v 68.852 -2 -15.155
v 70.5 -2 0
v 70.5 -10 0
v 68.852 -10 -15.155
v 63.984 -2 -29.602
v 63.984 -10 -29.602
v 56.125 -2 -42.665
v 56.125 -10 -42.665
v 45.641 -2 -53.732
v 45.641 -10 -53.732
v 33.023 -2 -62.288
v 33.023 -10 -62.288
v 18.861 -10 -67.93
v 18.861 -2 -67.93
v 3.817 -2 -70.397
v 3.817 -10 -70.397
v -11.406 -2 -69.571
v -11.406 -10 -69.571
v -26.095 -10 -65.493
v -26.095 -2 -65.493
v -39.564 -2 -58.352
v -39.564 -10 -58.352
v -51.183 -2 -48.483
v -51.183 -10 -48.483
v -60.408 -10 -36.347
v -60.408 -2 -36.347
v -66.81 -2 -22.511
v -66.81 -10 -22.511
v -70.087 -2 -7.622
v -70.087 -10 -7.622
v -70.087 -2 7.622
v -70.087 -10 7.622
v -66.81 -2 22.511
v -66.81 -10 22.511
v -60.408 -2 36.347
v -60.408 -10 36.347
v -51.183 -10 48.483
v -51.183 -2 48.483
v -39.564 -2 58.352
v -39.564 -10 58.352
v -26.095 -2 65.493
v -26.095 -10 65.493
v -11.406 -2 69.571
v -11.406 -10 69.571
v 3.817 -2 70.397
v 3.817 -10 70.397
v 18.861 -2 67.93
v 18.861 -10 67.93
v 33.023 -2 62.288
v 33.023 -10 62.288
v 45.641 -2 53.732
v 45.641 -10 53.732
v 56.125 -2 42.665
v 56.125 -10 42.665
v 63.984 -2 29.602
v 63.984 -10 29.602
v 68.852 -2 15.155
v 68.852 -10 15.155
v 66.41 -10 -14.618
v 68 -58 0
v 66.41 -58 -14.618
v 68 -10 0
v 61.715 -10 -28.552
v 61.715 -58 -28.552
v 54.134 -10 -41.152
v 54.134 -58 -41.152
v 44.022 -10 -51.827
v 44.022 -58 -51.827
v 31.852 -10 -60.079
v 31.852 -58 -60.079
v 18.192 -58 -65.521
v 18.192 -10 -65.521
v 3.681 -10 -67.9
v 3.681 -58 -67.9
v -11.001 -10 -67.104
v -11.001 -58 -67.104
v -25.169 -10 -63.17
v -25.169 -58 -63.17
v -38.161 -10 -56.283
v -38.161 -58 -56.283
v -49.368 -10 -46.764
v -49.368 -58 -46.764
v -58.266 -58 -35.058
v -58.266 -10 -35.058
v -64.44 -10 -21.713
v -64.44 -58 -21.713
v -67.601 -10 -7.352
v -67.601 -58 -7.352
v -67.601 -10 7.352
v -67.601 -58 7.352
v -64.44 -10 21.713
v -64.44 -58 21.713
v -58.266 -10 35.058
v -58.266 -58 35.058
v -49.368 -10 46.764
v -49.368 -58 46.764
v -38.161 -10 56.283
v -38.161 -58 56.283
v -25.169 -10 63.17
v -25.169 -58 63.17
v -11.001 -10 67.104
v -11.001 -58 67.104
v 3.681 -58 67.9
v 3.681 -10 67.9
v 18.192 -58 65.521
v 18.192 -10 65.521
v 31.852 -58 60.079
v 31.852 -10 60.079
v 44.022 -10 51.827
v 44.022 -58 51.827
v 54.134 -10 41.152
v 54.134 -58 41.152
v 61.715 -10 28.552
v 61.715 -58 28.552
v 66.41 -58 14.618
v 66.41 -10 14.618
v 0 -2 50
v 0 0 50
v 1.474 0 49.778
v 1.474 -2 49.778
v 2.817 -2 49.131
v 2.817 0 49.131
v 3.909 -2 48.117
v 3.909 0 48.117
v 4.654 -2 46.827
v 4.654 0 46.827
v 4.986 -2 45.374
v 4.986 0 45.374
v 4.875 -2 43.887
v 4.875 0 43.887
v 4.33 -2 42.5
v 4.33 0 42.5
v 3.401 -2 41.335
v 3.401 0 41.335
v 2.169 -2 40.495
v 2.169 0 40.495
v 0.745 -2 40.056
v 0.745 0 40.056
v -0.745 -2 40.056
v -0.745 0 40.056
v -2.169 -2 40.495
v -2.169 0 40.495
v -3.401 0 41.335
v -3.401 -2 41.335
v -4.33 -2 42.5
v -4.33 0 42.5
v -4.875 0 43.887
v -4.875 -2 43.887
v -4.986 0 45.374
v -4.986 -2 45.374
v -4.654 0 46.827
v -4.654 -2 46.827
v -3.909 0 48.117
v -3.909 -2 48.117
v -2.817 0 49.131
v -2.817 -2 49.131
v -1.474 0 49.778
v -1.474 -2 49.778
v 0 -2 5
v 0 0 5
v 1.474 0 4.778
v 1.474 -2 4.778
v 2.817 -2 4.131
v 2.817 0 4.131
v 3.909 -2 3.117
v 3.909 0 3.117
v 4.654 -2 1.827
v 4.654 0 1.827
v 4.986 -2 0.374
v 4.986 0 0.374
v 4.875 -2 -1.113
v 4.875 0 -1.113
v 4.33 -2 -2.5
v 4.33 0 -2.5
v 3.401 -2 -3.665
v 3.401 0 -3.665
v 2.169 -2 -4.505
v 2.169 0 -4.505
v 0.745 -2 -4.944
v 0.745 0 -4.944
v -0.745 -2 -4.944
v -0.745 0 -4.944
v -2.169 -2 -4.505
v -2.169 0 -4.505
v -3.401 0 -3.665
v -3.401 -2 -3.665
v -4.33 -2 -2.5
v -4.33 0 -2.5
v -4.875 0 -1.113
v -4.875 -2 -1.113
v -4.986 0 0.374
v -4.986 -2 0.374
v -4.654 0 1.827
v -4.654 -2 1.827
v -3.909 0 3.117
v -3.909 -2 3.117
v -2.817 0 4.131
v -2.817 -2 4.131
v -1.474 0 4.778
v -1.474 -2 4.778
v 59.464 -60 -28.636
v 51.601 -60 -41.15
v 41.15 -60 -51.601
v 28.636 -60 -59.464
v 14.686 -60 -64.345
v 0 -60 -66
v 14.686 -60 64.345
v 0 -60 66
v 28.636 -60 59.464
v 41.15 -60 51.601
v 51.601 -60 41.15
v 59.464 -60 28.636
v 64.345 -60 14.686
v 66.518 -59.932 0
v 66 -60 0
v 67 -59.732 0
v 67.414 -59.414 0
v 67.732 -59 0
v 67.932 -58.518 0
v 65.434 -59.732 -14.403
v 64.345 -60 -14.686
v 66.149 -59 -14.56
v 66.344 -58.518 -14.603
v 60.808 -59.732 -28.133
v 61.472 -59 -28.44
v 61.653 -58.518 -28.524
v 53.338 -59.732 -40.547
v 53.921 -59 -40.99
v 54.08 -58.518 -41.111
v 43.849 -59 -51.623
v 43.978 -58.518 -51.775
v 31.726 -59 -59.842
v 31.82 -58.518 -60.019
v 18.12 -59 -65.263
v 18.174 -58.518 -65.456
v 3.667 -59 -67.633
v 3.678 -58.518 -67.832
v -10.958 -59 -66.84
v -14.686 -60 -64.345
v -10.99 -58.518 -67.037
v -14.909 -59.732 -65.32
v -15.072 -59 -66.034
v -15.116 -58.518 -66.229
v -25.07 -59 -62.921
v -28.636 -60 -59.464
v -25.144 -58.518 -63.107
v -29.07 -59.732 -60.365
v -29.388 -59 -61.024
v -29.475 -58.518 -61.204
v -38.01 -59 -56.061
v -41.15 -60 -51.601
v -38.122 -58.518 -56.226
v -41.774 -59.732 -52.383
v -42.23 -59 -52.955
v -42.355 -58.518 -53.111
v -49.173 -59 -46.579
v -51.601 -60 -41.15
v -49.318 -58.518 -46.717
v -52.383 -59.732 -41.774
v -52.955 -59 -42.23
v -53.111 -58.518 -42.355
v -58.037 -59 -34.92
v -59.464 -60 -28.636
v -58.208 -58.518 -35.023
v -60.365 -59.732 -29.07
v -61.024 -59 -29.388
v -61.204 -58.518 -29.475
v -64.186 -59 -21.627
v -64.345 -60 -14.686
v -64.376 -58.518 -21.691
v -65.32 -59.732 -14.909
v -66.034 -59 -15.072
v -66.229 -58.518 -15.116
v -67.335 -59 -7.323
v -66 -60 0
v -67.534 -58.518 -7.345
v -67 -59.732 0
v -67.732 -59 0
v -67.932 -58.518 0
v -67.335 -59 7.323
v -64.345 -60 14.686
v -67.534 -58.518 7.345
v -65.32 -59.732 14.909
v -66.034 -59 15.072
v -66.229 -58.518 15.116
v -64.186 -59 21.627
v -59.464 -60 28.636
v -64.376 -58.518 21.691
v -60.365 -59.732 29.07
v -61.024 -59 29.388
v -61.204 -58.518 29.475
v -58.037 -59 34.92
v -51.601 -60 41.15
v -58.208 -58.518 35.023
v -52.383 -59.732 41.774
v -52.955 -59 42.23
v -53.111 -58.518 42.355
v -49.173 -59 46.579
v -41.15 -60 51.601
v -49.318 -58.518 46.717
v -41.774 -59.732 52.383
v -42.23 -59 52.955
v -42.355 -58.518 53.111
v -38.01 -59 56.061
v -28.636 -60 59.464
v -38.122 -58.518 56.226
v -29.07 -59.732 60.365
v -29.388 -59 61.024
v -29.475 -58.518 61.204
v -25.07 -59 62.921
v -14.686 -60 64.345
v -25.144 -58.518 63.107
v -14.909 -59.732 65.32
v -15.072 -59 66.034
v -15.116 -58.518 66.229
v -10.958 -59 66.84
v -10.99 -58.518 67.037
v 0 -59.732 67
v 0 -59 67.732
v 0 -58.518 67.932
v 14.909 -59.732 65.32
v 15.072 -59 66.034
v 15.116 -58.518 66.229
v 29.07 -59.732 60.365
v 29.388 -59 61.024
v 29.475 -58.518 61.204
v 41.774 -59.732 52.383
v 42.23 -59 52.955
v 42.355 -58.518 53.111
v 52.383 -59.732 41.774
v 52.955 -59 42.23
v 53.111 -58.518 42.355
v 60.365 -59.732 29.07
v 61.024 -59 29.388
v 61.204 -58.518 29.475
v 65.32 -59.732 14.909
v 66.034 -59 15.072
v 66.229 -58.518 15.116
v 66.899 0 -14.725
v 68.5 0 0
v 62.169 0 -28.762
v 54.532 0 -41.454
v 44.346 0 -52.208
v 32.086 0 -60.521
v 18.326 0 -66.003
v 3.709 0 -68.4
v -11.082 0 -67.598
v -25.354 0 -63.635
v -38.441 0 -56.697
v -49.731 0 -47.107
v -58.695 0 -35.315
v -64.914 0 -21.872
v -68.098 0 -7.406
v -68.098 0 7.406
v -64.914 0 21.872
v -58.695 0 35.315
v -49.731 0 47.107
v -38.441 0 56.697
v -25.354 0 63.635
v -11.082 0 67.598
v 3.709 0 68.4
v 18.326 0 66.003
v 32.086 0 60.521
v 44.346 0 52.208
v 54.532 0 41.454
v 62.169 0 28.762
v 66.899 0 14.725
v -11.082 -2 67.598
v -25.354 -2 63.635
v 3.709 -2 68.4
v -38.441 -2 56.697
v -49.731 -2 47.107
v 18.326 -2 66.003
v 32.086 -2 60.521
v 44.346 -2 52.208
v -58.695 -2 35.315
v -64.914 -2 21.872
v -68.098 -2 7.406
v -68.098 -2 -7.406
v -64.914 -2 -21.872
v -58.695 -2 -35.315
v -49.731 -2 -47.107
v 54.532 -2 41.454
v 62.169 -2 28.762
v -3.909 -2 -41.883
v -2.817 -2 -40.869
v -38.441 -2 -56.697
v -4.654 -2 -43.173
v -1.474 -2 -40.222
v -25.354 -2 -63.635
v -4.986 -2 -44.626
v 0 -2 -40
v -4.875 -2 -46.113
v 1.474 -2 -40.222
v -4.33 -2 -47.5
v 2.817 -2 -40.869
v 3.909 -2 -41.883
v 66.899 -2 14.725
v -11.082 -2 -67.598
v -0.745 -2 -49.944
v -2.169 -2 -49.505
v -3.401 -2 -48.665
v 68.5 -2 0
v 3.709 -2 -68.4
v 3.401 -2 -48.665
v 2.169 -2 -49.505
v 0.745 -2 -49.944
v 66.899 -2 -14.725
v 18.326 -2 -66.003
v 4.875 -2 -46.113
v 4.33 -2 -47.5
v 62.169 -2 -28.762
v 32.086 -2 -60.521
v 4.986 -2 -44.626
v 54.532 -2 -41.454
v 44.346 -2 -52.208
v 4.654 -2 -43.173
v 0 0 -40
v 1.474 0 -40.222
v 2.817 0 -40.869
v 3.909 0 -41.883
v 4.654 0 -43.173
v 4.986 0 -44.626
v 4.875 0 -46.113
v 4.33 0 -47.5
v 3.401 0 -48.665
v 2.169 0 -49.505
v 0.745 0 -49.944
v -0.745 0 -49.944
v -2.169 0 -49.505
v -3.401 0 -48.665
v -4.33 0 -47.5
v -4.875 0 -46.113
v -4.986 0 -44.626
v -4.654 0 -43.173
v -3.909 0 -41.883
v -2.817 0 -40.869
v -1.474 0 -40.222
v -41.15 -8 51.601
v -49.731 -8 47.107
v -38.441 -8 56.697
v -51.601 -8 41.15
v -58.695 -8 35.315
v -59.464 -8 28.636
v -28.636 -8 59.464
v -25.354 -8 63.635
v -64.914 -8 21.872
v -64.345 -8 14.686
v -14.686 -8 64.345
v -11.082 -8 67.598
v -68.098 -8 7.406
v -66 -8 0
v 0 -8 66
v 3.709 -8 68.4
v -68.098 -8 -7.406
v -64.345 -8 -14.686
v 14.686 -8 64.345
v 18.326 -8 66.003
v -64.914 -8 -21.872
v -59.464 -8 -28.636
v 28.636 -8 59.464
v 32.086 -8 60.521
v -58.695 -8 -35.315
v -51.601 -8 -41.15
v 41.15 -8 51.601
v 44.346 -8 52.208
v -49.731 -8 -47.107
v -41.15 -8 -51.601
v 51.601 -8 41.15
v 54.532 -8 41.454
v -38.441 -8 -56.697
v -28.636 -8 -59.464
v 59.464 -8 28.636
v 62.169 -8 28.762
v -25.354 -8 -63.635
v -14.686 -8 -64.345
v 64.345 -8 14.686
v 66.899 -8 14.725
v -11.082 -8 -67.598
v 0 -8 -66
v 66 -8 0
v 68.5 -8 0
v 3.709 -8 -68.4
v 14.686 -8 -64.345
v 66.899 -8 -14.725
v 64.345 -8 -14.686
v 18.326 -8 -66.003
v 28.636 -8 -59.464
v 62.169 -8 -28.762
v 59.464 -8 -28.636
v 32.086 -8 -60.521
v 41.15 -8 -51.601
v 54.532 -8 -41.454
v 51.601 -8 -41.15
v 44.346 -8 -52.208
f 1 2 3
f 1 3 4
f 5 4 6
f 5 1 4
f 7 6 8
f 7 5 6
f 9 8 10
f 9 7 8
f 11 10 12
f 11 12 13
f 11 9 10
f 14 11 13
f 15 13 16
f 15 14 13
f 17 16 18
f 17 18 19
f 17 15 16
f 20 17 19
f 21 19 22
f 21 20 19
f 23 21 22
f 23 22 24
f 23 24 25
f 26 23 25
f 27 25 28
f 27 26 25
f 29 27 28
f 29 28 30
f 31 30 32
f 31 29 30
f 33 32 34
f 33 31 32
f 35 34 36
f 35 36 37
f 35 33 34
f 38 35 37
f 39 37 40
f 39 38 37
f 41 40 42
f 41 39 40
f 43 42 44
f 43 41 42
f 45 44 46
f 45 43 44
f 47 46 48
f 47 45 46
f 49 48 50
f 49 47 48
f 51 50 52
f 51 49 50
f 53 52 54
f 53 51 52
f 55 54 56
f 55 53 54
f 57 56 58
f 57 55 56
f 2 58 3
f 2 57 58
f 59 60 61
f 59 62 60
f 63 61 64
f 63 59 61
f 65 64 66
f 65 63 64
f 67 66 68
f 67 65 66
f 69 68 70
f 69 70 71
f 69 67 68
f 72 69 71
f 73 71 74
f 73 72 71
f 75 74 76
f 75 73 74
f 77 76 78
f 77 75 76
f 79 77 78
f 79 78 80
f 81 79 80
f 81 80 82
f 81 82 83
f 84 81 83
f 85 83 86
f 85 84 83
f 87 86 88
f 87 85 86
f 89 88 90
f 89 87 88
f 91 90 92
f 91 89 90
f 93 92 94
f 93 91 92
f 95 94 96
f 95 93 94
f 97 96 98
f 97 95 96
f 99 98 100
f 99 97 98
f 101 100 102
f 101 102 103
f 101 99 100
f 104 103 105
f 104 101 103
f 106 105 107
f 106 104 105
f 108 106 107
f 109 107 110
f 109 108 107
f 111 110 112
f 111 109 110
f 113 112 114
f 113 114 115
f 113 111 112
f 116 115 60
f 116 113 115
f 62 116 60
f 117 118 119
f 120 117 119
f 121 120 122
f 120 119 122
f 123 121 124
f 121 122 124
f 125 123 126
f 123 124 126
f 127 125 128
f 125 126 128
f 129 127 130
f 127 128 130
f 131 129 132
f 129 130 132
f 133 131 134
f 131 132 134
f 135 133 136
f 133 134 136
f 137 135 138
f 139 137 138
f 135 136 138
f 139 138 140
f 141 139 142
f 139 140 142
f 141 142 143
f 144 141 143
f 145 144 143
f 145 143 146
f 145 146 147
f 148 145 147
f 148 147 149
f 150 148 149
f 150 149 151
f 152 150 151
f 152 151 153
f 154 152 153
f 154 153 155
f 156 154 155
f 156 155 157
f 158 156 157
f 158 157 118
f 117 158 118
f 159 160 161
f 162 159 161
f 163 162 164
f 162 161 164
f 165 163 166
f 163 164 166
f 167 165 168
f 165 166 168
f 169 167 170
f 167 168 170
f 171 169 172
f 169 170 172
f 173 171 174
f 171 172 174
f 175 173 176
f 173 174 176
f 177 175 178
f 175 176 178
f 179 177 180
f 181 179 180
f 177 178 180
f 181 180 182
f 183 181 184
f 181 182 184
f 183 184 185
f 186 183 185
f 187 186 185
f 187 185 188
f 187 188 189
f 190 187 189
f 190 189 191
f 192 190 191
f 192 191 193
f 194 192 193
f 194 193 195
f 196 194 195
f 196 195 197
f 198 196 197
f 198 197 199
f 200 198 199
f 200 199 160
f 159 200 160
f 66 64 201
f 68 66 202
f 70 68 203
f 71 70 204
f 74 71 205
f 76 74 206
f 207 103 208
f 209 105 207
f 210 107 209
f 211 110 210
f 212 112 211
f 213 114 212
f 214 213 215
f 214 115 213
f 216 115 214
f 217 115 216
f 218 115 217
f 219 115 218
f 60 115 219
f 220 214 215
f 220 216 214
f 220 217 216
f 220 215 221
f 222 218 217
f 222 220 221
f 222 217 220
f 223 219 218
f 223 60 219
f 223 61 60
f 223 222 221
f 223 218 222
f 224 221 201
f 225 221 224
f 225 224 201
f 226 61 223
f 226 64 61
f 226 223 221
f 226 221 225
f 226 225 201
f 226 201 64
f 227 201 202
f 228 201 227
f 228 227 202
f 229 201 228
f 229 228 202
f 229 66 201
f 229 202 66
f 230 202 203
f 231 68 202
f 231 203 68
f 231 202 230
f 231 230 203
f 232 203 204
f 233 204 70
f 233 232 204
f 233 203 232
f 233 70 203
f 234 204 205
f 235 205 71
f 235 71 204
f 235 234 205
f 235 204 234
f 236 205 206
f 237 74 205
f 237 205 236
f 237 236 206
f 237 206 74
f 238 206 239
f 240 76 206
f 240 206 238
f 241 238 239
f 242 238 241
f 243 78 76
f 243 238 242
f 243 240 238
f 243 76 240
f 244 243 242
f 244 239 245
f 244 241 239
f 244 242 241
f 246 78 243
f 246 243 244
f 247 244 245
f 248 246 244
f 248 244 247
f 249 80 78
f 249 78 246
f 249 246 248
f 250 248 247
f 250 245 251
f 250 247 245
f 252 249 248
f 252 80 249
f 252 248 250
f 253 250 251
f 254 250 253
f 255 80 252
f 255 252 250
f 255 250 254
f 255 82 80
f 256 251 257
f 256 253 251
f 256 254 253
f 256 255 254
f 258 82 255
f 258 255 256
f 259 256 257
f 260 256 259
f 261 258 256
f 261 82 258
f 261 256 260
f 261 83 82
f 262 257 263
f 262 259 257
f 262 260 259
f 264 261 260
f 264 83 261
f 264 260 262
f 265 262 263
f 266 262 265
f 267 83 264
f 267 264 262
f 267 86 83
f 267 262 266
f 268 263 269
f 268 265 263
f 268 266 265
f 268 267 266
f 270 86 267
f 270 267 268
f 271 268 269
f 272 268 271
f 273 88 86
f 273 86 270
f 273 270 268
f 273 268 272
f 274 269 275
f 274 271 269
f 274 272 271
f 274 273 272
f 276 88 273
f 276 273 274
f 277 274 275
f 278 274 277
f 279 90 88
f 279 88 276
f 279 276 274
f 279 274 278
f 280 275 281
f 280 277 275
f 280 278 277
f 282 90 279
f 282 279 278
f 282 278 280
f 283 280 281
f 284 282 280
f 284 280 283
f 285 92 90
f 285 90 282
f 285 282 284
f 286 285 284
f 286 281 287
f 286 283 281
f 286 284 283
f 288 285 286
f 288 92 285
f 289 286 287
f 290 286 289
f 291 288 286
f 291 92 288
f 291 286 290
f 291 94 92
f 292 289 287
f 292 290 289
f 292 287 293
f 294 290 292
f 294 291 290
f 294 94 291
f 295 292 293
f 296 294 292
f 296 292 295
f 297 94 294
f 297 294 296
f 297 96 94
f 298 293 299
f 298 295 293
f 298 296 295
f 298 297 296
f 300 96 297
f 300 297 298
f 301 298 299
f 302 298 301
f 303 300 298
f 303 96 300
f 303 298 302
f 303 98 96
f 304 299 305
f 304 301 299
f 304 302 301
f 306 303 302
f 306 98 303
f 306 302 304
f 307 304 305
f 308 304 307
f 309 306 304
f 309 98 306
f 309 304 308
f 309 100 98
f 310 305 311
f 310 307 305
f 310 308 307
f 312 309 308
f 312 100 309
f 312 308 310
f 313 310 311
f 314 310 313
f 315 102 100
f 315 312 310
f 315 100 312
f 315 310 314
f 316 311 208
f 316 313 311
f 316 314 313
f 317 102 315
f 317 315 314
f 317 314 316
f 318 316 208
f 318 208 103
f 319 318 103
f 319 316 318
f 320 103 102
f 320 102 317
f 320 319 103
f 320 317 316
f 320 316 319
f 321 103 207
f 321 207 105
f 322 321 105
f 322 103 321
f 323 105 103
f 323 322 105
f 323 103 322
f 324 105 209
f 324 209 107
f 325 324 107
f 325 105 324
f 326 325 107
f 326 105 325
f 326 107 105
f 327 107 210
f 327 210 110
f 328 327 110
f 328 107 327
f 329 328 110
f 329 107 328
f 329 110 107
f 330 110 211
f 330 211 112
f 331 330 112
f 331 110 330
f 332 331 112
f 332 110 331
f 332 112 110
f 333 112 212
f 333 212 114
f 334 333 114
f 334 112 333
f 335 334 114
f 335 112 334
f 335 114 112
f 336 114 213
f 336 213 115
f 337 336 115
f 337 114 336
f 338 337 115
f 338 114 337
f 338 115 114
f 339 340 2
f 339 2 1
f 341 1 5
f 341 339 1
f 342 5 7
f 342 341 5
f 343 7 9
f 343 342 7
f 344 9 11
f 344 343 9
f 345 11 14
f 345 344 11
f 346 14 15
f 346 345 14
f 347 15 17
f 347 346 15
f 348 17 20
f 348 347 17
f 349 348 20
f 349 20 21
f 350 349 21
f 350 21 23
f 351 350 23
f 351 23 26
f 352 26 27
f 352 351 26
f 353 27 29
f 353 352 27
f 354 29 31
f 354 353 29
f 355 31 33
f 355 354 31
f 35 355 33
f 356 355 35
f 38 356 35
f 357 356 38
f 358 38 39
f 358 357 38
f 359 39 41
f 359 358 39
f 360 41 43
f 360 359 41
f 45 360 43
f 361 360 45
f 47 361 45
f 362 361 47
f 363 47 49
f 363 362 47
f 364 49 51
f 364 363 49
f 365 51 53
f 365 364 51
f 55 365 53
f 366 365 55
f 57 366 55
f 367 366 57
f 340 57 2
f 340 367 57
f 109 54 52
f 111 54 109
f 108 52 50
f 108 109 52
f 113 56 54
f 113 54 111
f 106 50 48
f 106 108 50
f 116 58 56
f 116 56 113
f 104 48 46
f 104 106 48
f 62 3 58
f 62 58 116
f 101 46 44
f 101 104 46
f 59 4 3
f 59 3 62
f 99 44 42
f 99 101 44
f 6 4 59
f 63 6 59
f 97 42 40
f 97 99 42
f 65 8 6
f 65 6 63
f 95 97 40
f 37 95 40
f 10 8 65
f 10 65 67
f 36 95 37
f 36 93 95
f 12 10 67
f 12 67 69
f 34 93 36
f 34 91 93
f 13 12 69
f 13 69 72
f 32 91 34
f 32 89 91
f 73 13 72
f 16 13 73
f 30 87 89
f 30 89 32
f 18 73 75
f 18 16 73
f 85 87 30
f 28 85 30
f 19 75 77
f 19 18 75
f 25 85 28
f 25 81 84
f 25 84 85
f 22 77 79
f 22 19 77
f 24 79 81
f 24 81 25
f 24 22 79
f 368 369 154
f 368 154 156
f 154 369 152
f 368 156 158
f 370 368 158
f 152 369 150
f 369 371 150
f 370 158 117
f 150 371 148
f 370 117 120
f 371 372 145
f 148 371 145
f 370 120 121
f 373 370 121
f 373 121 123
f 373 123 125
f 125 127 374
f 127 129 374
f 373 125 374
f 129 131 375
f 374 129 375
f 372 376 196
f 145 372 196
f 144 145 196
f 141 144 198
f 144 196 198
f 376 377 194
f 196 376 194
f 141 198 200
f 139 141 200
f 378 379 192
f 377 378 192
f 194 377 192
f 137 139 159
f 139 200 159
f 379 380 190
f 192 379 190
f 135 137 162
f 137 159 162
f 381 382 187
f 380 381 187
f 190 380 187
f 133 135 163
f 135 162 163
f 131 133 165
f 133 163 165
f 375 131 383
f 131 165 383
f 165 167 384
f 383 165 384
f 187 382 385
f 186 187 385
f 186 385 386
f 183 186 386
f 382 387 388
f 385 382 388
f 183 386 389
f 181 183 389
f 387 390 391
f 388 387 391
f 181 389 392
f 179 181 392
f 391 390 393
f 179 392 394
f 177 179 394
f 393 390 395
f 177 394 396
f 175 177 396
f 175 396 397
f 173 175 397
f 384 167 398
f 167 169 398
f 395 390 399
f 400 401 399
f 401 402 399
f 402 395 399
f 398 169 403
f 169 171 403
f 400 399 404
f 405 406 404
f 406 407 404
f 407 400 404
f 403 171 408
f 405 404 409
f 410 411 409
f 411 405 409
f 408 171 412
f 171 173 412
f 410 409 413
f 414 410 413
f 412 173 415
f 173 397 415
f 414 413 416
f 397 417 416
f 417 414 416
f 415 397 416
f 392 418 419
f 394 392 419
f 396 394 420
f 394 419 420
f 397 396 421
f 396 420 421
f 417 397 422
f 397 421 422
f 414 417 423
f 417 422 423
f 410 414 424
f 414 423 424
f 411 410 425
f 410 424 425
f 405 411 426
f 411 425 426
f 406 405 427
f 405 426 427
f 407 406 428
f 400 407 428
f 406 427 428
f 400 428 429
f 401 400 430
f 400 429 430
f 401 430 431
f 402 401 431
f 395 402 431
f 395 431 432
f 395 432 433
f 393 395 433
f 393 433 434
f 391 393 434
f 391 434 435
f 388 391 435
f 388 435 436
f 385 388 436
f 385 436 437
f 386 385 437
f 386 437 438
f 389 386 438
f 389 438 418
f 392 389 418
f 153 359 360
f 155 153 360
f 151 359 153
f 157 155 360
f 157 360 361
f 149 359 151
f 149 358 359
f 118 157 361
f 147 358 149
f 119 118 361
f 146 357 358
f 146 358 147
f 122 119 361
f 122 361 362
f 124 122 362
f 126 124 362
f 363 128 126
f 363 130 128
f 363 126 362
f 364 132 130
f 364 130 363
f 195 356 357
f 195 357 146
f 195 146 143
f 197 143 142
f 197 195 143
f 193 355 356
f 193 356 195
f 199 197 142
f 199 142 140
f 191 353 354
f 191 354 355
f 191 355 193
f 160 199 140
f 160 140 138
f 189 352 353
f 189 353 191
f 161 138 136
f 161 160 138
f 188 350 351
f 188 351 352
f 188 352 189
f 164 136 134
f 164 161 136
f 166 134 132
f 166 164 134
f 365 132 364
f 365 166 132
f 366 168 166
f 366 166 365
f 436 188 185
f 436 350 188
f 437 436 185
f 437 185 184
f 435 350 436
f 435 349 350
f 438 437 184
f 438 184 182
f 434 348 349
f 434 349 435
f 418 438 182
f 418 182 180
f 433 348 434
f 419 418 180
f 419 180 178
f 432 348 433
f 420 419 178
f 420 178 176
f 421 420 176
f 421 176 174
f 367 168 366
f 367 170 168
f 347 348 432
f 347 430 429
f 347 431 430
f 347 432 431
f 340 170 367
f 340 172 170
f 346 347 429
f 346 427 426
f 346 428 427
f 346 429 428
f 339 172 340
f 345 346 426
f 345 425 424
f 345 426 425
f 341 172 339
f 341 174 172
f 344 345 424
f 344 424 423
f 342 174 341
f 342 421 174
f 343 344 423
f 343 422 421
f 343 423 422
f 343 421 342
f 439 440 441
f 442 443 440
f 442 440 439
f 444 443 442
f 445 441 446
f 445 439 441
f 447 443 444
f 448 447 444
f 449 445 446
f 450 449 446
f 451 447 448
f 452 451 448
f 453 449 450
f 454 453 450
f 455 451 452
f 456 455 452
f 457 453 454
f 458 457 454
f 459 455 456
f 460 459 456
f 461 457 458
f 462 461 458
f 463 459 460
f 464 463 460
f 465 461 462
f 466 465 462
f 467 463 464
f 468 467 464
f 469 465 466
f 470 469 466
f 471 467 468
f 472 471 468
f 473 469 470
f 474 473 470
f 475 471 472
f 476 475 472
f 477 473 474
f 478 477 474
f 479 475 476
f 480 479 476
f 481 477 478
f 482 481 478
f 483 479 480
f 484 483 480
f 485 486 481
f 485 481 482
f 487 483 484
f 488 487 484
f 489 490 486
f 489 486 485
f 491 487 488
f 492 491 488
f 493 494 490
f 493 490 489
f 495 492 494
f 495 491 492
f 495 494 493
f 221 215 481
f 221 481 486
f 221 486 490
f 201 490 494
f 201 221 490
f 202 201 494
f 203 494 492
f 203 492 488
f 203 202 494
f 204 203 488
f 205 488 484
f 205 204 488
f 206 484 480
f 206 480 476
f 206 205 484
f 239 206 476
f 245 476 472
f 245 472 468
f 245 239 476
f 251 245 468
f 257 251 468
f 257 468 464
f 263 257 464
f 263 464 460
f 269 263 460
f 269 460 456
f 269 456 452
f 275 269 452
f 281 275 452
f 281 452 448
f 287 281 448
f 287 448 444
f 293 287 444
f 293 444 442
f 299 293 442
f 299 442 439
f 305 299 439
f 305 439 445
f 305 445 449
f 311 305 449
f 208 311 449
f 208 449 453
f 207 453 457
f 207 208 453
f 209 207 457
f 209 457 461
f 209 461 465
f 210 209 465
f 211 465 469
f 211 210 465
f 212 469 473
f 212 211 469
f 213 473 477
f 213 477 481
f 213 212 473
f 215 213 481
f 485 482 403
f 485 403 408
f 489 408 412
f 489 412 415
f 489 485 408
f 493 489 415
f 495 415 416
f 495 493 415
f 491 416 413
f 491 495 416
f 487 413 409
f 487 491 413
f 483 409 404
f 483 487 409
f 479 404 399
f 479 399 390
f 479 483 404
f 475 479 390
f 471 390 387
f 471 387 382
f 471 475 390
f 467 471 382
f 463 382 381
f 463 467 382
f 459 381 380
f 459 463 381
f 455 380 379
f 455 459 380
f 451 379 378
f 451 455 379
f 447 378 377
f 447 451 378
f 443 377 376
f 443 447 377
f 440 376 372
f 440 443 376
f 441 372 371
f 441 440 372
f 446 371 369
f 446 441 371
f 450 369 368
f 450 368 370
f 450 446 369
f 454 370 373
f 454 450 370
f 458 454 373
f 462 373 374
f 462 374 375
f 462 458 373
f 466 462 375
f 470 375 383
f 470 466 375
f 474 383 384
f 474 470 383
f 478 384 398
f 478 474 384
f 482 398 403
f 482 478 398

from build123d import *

# Parameters (mm, degrees)
SVUOTA5_START            = -60
SVUOTA5_OUTLINE_R        = 66
SVUOTA5_DEPTH            = 58
SVUOTA5_START_2          = -8
SVUOTA5_2_OUTLINE_R      = 68.499999813
SVUOTA5_2_OUTLINE_R_2    = 66
SVUOTA5_2_DEPTH          = 6
SMUSSO1_SIZE             = 2
SCHIZZO3_R               = 5
TAGLIO_ESTRUSIONE1_DEPTH = 10
SCHIZZO4_R               = 5
TAGLIO_ESTRUSIONE2_DEPTH = 10


# Read off the part's stored shape, not the designer's step: Svuota5
with BuildPart() as part:
    # Schizzo1 → Rivoluzione3 (revolve)
    with BuildSketch(Plane.XY):
        with BuildLine():
            Line((0, 0), (0, -10))
            Line((0, -10), (0, -60))
            Line((0, -60), (66, -60))
            ThreePointArc((66, -60), (67.414213562, -59.414213562), (68, -58))
            Line((68, -58), (68, -10))
            Line((68, -10), (70.499999813, -10))
            Line((70.499999813, -10), (70.499999813, 0))
            Line((70.499999813, 0), (0, 0))
        make_face()
    revolve(axis=Axis((0, -60, 0), (0, 1, 0)))

    # Svuota5 outline → Svuota5 (cut)
    with BuildSketch(Plane(origin=(0, 0, 0), x_dir=(1, 0, 0), z_dir=(0, 1, 0)).offset(SVUOTA5_START)):
        Circle(SVUOTA5_OUTLINE_R)
    extrude(amount=SVUOTA5_DEPTH, mode=Mode.SUBTRACT)

    # Svuota5 2 outline → Svuota5 2 (cut)
    with BuildSketch(Plane(origin=(0, 0, 0), x_dir=(1, 0, 0), z_dir=(0, 1, 0)).offset(SVUOTA5_START_2)):
        Circle(SVUOTA5_2_OUTLINE_R)
        Circle(SVUOTA5_2_OUTLINE_R_2, mode=Mode.SUBTRACT)
    extrude(amount=SVUOTA5_2_DEPTH, mode=Mode.SUBTRACT)

    # Smusso1
    smusso1_edges = [part.edges().sort_by_distance(p)[0] for p in [
        (-70.499999813, 0, 0),
    ]]
    chamfer(smusso1_edges, length=SMUSSO1_SIZE)

    # Schizzo3 → Taglio-Estrusione1 (cut)
    with BuildSketch(Plane(origin=(0, 0, 0), x_dir=(1, 0, 0), z_dir=(0, 1, 0))):
        with Locations(Location((0, 0, 0), (0, 0, 270))):
            Circle(SCHIZZO3_R)
    extrude(amount=-TAGLIO_ESTRUSIONE1_DEPTH, mode=Mode.SUBTRACT)

    # Schizzo4 → Taglio-Estrusione2 (cut)
    with BuildSketch(Plane(origin=(0, 0, 0), x_dir=(1, 0, 0), z_dir=(0, 1, 0))):
        with Locations(Location((0, 45, 0), (0, 0, 270))):
            Circle(SCHIZZO4_R)
        with Locations(Location((0, -45, 0), (0, 0, 270))):
            Circle(SCHIZZO4_R)
    extrude(amount=-TAGLIO_ESTRUSIONE2_DEPTH, mode=Mode.SUBTRACT)


solid = part.part
